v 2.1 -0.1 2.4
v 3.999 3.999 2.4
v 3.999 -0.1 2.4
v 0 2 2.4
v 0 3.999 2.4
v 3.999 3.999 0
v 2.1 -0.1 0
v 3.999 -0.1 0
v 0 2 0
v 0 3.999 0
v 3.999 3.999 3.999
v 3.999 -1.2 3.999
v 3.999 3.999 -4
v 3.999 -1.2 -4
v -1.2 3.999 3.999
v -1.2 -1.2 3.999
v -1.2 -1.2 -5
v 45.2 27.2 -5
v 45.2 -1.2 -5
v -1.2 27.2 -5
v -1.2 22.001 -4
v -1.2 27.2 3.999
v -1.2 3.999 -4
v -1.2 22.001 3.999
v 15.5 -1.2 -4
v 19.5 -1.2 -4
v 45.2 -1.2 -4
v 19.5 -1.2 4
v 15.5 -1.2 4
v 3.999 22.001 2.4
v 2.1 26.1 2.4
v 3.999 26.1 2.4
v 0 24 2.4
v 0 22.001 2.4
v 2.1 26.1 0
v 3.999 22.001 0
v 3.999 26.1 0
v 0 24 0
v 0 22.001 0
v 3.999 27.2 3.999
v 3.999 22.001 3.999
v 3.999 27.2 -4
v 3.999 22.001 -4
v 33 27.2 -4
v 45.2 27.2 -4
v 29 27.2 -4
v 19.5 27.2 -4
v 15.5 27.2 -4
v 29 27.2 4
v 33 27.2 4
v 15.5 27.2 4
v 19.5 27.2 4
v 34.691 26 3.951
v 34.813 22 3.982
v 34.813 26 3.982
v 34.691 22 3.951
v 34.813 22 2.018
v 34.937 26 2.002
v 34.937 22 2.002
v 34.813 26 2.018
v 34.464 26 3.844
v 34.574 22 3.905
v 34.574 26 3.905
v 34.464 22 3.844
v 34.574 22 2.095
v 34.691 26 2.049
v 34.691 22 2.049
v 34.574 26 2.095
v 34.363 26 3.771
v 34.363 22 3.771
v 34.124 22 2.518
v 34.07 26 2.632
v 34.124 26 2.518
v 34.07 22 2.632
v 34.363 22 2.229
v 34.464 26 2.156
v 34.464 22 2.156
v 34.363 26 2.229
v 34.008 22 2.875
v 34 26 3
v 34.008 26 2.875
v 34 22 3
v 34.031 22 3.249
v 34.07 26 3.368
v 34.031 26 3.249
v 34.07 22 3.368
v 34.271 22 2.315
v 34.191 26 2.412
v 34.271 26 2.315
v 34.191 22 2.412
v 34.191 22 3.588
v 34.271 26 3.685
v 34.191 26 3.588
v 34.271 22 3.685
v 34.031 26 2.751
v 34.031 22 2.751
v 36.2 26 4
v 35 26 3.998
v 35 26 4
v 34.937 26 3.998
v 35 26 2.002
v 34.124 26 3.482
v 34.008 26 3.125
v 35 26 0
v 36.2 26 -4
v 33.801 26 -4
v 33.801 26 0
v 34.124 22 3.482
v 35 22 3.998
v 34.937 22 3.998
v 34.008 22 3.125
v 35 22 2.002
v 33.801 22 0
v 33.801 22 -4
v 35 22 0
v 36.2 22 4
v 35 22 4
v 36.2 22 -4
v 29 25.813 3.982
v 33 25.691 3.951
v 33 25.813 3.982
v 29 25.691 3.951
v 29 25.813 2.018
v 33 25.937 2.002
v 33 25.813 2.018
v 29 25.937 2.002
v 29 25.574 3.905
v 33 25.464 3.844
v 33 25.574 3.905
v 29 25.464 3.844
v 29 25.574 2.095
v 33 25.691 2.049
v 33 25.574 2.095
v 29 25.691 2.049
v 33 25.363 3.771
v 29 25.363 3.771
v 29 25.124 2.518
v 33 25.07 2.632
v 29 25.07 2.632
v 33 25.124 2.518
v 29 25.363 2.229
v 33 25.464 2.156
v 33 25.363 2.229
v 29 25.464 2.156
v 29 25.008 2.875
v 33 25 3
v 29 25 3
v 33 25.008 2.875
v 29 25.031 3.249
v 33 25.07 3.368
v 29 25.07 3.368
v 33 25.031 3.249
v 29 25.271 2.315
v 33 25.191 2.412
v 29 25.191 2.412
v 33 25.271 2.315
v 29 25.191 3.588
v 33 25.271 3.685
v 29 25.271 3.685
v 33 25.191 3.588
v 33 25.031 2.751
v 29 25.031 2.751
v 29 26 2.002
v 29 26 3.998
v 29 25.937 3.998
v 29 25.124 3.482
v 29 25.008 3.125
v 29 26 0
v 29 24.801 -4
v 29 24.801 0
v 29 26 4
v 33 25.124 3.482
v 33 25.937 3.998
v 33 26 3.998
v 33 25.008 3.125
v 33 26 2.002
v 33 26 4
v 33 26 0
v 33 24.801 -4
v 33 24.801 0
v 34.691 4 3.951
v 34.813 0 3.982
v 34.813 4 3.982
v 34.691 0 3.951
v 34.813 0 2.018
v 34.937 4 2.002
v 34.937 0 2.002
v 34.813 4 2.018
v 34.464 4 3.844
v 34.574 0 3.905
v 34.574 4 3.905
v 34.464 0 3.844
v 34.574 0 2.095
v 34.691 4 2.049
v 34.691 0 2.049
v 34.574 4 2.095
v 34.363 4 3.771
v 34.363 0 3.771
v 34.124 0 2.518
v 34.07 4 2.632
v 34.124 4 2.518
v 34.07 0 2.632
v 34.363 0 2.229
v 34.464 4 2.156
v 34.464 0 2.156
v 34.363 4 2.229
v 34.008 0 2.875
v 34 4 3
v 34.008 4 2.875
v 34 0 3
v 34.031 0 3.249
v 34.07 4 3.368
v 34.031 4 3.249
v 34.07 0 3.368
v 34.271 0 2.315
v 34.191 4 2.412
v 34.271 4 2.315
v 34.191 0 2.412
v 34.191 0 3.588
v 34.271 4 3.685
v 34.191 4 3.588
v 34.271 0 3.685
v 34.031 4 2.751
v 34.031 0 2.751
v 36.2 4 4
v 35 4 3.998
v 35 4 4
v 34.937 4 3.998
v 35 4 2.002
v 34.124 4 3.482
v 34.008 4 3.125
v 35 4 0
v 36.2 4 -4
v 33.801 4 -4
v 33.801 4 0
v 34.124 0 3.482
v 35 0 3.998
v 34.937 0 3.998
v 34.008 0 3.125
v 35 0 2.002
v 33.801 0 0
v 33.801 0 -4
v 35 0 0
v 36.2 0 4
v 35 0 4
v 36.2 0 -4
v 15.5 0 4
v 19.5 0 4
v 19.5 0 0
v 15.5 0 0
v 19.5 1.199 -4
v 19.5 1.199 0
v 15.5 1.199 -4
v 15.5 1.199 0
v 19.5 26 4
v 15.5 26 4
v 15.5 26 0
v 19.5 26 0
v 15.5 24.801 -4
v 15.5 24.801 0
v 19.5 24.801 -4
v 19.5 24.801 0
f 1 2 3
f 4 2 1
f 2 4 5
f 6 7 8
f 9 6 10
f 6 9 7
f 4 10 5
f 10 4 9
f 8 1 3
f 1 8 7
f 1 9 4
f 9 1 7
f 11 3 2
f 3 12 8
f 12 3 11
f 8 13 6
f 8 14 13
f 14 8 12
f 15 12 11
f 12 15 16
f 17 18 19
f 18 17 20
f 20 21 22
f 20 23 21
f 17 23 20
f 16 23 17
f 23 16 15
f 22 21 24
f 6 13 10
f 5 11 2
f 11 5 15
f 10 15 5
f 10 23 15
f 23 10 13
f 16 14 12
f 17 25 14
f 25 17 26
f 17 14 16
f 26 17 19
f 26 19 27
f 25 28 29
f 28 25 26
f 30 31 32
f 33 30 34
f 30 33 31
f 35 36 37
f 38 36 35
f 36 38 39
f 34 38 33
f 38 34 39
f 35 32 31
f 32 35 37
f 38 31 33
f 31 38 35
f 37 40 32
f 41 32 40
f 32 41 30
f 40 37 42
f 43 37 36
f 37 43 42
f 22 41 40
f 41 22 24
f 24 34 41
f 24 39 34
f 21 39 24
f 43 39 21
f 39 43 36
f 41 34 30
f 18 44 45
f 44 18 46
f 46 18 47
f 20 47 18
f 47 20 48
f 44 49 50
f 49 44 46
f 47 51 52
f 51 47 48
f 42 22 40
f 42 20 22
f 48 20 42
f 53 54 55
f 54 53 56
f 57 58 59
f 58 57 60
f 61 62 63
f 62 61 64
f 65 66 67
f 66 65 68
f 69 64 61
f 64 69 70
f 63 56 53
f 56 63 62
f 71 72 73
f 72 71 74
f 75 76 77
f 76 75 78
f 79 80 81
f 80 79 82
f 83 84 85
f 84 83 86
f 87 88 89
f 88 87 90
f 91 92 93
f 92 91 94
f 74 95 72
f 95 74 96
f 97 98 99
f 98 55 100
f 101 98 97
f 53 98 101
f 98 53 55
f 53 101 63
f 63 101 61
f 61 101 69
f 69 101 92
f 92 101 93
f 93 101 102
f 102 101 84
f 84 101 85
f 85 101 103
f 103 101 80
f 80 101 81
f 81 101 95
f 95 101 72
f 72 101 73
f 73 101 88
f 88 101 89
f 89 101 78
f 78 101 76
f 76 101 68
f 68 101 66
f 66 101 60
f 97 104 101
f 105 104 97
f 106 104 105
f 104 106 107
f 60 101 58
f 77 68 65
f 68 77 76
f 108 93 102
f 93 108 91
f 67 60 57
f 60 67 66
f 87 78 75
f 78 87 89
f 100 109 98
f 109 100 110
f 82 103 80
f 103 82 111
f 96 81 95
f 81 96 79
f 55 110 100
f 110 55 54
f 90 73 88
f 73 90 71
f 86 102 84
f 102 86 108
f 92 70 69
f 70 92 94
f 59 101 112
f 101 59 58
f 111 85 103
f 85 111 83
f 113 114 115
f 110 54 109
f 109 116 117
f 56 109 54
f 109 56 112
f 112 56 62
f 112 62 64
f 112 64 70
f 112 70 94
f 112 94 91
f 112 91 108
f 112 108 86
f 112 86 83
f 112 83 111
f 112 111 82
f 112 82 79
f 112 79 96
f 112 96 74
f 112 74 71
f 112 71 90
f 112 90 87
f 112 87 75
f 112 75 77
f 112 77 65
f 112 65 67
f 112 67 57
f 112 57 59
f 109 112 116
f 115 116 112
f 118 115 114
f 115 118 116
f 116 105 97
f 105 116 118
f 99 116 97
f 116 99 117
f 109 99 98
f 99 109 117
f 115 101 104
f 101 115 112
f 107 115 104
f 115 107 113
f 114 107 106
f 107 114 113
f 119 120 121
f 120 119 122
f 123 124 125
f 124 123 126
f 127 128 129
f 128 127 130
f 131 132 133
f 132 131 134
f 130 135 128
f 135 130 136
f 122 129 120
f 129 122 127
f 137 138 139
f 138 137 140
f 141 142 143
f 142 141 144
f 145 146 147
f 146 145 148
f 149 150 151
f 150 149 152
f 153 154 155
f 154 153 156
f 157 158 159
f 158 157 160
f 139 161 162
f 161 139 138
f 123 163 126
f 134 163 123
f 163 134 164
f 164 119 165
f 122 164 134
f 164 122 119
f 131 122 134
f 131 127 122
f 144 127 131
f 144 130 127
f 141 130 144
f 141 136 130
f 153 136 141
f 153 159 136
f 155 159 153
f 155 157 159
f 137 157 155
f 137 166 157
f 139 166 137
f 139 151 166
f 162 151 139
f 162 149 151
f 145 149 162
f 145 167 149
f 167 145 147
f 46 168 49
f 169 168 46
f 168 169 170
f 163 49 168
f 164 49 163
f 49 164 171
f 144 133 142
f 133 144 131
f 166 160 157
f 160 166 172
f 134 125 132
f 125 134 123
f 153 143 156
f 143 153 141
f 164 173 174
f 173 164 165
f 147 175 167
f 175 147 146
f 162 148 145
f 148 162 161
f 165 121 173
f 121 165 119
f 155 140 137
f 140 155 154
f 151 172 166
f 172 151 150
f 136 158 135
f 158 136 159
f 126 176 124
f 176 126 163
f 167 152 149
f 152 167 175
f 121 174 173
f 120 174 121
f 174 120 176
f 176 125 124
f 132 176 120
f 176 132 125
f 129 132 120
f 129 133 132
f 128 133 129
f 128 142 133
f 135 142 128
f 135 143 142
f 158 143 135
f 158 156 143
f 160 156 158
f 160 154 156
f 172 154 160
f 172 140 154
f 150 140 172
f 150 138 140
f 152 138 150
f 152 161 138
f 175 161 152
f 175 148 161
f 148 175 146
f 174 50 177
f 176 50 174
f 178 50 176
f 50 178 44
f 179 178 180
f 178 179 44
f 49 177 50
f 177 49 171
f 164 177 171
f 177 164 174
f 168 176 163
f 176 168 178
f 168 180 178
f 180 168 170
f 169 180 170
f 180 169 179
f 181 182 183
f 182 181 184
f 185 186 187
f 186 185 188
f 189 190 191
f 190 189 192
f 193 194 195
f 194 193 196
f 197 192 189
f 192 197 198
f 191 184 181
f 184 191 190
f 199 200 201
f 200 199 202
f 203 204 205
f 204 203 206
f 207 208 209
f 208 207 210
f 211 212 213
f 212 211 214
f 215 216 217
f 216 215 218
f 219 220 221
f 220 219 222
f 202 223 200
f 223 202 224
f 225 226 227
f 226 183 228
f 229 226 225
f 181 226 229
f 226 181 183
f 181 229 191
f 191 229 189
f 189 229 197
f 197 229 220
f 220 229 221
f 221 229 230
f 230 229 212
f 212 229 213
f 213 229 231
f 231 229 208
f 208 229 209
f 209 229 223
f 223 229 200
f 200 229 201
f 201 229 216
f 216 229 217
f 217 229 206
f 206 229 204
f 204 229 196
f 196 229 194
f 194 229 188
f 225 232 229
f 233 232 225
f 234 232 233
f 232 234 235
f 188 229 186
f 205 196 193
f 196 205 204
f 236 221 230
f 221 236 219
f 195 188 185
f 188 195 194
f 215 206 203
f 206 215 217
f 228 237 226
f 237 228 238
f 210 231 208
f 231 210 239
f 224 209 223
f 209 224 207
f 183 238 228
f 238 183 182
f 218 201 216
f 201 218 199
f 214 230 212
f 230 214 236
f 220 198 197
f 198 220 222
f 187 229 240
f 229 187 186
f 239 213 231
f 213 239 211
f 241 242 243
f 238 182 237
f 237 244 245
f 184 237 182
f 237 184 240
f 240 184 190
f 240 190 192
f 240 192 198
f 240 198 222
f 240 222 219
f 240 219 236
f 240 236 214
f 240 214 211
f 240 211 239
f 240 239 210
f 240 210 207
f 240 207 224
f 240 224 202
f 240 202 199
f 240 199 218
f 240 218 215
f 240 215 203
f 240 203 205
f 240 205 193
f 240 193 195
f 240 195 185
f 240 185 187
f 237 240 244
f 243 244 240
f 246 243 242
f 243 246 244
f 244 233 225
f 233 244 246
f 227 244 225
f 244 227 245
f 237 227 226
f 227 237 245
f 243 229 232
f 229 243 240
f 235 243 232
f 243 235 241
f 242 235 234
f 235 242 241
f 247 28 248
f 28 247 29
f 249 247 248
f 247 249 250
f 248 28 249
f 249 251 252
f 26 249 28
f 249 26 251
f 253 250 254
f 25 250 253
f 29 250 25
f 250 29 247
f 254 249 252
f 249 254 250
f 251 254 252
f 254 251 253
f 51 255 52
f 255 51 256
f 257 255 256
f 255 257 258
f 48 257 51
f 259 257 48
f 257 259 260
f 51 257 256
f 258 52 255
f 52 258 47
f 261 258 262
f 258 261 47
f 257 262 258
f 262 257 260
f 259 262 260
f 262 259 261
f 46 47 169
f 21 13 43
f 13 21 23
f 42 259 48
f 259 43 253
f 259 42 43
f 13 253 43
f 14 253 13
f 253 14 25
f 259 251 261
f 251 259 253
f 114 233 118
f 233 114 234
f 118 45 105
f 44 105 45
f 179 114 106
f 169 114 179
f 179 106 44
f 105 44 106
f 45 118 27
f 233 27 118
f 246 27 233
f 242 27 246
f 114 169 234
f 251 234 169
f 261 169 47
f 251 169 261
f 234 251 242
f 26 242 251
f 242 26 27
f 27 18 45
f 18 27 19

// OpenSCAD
// Copyright (C) Danny Havenith 2020
// This design is licensed under the Creative Commons - Attribution license
// See https://creativecommons.org/licenses/by/4.0/
//
// usage: in your project file add:
//    use <wemos_d1_mini_clip.scad>
// Then call:
//    wemos_d1_mini_clip( some_offset);
// This will add the necessary clips to hold the pcb in place.
// offset is the height of the bottom of the pcb from the bottom of the clips, 
// or in other words: the height of the clips.
// The clips are placed to have the bottom side of one of the corners of the PCB at [0,0,0]
//
// The clips are placed "in mid air", you still need to have some ground plate
// to attach the clips to. This is demonstrated in the module demo().
// 
// Slight modification to extend the base so the device clip wedges inside the back mount. - github user rogerw-gh
// Make pcb offset from base a customiser variable.
// N.B. thicker pcbs will need the thickness increasing, the d1 mini clone I measured has a board thickness of 1mm, but needs 2.5mm so it fits,
// Hanging corners are not printable to size, but are so small they print reasonably well.
//
wemos_d1_pcb_width = 26;
wemos_d1_pcb_length = 35;
wemos_d1_pcb_thickness = 2;
wemos_d1_thin_wall = 1.2;
wemos_d1_clip = 1; // radius of the wemos_d1_clip that sticks out at the top of a pillar.
wemos_d1_tab_width = 4;

pcb_offset  = 5;

/**
* essentially a cube with one of the edges cut off.
*/
module edged_box()
{
    rib = 4;
    sag = .4;
    dims = [rib+.1,rib+.1,wemos_d1_pcb_thickness+sag];
    edge_off = 2;
    d = .001;
    d3 = [d,d,d];
    // somewhat convoluted, but it works
    mirror([0,1,0]) translate( [0, -rib, 0])
    difference()
    {
        cube( dims);
        translate([0,rib-edge_off,-d]) 
            rotate([0,0,45]) cube(dims + 2*d3);
    }
}

/**
* Pillar that holds the NE,NW corners of the PCB (the dull-edged corners)
*/
module frame_corner( height)
{
    wemos_d1_thin_wall = 1.2;
    wemos_d1_clip = 1;
    d3 = [.001, .001, .001];
    edge = wemos_d1_pcb_thickness + 2*wemos_d1_clip;
    pillar_dims = [4,4,height + edge] + [wemos_d1_thin_wall, wemos_d1_thin_wall, 0] - d3;

    difference()
    {
        translate([-wemos_d1_thin_wall,-wemos_d1_thin_wall,-height]) cube (pillar_dims);
        edged_box();
    }
}
/**
* A pillar that keeps the edge of the PCB in place. If doClip is true, 
* there will be a little tab at the top of the pillar to push the PCB down.
*/
module pillar( height, doClip=true)
{
    d = .001;
    edge = wemos_d1_pcb_thickness + 2*wemos_d1_clip;
    tab_dims = [wemos_d1_thin_wall, 4, height + edge];
    if (doClip)
    {
        translate([0,-wemos_d1_tab_width/2,edge - wemos_d1_clip]) rotate([90,0,0]) cylinder(h = wemos_d1_tab_width, r = wemos_d1_clip, center=true, $fn = 50);
    }
    translate([0,-wemos_d1_tab_width,-height]) cube( tab_dims);
    translate([-wemos_d1_thin_wall+d, -wemos_d1_tab_width, -height]) cube([wemos_d1_thin_wall, wemos_d1_tab_width, height]);
}

/** 
* clip to hold a wemos d1 mini
* This module can be used in enclosures. It generates clips that can
* hold a Wemos D1 Mini in place
**/
module wemos_d1_mini_clip( offset = 5)
{

    // frame corners on the NW, NE side
    frame_corner( offset);
    translate([0, wemos_d1_pcb_width, 0]) mirror([0,1,0]) frame_corner(offset);
    
    //two tabs supporting the SE side
    translate([wemos_d1_pcb_length, wemos_d1_pcb_width, 0]) pillar(offset);
    translate([wemos_d1_pcb_length-wemos_d1_tab_width - 2*wemos_d1_clip, wemos_d1_pcb_width, 0]) rotate([0,0,90]) pillar(offset);
    
    // one pillar supporting the SW side (keep the west open for the reset button)
    translate([wemos_d1_pcb_length, wemos_d1_tab_width, 0]) pillar(offset);
    
    // two extra tabs holding the sides in the E and W position
    translate([wemos_d1_pcb_length + wemos_d1_tab_width, 0, 0] * .5) rotate([0,0,-90]) pillar( offset, false);
    translate([(wemos_d1_pcb_length - wemos_d1_tab_width)/2, wemos_d1_pcb_width, 0] )rotate([0,0,90]) pillar( offset, false);
}

module wemos_d1_mini_demo()
{
    offset = pcb_offset;

    wemos_d1_mini_clip( offset);
    
    // bottom to hold it all together
    translate([-wemos_d1_thin_wall, -wemos_d1_thin_wall,-offset]) cube([ wemos_d1_pcb_length, wemos_d1_pcb_width, 1] + 2*[wemos_d1_thin_wall, wemos_d1_thin_wall,0]);
    //extension to slip inside Vindrikting case
    translate([-wemos_d1_thin_wall, -wemos_d1_thin_wall,-offset]) cube([ wemos_d1_pcb_length+9, wemos_d1_pcb_width, 1] + 2*[wemos_d1_thin_wall, wemos_d1_thin_wall,0]);
    
}

wemos_d1_mini_demo();
